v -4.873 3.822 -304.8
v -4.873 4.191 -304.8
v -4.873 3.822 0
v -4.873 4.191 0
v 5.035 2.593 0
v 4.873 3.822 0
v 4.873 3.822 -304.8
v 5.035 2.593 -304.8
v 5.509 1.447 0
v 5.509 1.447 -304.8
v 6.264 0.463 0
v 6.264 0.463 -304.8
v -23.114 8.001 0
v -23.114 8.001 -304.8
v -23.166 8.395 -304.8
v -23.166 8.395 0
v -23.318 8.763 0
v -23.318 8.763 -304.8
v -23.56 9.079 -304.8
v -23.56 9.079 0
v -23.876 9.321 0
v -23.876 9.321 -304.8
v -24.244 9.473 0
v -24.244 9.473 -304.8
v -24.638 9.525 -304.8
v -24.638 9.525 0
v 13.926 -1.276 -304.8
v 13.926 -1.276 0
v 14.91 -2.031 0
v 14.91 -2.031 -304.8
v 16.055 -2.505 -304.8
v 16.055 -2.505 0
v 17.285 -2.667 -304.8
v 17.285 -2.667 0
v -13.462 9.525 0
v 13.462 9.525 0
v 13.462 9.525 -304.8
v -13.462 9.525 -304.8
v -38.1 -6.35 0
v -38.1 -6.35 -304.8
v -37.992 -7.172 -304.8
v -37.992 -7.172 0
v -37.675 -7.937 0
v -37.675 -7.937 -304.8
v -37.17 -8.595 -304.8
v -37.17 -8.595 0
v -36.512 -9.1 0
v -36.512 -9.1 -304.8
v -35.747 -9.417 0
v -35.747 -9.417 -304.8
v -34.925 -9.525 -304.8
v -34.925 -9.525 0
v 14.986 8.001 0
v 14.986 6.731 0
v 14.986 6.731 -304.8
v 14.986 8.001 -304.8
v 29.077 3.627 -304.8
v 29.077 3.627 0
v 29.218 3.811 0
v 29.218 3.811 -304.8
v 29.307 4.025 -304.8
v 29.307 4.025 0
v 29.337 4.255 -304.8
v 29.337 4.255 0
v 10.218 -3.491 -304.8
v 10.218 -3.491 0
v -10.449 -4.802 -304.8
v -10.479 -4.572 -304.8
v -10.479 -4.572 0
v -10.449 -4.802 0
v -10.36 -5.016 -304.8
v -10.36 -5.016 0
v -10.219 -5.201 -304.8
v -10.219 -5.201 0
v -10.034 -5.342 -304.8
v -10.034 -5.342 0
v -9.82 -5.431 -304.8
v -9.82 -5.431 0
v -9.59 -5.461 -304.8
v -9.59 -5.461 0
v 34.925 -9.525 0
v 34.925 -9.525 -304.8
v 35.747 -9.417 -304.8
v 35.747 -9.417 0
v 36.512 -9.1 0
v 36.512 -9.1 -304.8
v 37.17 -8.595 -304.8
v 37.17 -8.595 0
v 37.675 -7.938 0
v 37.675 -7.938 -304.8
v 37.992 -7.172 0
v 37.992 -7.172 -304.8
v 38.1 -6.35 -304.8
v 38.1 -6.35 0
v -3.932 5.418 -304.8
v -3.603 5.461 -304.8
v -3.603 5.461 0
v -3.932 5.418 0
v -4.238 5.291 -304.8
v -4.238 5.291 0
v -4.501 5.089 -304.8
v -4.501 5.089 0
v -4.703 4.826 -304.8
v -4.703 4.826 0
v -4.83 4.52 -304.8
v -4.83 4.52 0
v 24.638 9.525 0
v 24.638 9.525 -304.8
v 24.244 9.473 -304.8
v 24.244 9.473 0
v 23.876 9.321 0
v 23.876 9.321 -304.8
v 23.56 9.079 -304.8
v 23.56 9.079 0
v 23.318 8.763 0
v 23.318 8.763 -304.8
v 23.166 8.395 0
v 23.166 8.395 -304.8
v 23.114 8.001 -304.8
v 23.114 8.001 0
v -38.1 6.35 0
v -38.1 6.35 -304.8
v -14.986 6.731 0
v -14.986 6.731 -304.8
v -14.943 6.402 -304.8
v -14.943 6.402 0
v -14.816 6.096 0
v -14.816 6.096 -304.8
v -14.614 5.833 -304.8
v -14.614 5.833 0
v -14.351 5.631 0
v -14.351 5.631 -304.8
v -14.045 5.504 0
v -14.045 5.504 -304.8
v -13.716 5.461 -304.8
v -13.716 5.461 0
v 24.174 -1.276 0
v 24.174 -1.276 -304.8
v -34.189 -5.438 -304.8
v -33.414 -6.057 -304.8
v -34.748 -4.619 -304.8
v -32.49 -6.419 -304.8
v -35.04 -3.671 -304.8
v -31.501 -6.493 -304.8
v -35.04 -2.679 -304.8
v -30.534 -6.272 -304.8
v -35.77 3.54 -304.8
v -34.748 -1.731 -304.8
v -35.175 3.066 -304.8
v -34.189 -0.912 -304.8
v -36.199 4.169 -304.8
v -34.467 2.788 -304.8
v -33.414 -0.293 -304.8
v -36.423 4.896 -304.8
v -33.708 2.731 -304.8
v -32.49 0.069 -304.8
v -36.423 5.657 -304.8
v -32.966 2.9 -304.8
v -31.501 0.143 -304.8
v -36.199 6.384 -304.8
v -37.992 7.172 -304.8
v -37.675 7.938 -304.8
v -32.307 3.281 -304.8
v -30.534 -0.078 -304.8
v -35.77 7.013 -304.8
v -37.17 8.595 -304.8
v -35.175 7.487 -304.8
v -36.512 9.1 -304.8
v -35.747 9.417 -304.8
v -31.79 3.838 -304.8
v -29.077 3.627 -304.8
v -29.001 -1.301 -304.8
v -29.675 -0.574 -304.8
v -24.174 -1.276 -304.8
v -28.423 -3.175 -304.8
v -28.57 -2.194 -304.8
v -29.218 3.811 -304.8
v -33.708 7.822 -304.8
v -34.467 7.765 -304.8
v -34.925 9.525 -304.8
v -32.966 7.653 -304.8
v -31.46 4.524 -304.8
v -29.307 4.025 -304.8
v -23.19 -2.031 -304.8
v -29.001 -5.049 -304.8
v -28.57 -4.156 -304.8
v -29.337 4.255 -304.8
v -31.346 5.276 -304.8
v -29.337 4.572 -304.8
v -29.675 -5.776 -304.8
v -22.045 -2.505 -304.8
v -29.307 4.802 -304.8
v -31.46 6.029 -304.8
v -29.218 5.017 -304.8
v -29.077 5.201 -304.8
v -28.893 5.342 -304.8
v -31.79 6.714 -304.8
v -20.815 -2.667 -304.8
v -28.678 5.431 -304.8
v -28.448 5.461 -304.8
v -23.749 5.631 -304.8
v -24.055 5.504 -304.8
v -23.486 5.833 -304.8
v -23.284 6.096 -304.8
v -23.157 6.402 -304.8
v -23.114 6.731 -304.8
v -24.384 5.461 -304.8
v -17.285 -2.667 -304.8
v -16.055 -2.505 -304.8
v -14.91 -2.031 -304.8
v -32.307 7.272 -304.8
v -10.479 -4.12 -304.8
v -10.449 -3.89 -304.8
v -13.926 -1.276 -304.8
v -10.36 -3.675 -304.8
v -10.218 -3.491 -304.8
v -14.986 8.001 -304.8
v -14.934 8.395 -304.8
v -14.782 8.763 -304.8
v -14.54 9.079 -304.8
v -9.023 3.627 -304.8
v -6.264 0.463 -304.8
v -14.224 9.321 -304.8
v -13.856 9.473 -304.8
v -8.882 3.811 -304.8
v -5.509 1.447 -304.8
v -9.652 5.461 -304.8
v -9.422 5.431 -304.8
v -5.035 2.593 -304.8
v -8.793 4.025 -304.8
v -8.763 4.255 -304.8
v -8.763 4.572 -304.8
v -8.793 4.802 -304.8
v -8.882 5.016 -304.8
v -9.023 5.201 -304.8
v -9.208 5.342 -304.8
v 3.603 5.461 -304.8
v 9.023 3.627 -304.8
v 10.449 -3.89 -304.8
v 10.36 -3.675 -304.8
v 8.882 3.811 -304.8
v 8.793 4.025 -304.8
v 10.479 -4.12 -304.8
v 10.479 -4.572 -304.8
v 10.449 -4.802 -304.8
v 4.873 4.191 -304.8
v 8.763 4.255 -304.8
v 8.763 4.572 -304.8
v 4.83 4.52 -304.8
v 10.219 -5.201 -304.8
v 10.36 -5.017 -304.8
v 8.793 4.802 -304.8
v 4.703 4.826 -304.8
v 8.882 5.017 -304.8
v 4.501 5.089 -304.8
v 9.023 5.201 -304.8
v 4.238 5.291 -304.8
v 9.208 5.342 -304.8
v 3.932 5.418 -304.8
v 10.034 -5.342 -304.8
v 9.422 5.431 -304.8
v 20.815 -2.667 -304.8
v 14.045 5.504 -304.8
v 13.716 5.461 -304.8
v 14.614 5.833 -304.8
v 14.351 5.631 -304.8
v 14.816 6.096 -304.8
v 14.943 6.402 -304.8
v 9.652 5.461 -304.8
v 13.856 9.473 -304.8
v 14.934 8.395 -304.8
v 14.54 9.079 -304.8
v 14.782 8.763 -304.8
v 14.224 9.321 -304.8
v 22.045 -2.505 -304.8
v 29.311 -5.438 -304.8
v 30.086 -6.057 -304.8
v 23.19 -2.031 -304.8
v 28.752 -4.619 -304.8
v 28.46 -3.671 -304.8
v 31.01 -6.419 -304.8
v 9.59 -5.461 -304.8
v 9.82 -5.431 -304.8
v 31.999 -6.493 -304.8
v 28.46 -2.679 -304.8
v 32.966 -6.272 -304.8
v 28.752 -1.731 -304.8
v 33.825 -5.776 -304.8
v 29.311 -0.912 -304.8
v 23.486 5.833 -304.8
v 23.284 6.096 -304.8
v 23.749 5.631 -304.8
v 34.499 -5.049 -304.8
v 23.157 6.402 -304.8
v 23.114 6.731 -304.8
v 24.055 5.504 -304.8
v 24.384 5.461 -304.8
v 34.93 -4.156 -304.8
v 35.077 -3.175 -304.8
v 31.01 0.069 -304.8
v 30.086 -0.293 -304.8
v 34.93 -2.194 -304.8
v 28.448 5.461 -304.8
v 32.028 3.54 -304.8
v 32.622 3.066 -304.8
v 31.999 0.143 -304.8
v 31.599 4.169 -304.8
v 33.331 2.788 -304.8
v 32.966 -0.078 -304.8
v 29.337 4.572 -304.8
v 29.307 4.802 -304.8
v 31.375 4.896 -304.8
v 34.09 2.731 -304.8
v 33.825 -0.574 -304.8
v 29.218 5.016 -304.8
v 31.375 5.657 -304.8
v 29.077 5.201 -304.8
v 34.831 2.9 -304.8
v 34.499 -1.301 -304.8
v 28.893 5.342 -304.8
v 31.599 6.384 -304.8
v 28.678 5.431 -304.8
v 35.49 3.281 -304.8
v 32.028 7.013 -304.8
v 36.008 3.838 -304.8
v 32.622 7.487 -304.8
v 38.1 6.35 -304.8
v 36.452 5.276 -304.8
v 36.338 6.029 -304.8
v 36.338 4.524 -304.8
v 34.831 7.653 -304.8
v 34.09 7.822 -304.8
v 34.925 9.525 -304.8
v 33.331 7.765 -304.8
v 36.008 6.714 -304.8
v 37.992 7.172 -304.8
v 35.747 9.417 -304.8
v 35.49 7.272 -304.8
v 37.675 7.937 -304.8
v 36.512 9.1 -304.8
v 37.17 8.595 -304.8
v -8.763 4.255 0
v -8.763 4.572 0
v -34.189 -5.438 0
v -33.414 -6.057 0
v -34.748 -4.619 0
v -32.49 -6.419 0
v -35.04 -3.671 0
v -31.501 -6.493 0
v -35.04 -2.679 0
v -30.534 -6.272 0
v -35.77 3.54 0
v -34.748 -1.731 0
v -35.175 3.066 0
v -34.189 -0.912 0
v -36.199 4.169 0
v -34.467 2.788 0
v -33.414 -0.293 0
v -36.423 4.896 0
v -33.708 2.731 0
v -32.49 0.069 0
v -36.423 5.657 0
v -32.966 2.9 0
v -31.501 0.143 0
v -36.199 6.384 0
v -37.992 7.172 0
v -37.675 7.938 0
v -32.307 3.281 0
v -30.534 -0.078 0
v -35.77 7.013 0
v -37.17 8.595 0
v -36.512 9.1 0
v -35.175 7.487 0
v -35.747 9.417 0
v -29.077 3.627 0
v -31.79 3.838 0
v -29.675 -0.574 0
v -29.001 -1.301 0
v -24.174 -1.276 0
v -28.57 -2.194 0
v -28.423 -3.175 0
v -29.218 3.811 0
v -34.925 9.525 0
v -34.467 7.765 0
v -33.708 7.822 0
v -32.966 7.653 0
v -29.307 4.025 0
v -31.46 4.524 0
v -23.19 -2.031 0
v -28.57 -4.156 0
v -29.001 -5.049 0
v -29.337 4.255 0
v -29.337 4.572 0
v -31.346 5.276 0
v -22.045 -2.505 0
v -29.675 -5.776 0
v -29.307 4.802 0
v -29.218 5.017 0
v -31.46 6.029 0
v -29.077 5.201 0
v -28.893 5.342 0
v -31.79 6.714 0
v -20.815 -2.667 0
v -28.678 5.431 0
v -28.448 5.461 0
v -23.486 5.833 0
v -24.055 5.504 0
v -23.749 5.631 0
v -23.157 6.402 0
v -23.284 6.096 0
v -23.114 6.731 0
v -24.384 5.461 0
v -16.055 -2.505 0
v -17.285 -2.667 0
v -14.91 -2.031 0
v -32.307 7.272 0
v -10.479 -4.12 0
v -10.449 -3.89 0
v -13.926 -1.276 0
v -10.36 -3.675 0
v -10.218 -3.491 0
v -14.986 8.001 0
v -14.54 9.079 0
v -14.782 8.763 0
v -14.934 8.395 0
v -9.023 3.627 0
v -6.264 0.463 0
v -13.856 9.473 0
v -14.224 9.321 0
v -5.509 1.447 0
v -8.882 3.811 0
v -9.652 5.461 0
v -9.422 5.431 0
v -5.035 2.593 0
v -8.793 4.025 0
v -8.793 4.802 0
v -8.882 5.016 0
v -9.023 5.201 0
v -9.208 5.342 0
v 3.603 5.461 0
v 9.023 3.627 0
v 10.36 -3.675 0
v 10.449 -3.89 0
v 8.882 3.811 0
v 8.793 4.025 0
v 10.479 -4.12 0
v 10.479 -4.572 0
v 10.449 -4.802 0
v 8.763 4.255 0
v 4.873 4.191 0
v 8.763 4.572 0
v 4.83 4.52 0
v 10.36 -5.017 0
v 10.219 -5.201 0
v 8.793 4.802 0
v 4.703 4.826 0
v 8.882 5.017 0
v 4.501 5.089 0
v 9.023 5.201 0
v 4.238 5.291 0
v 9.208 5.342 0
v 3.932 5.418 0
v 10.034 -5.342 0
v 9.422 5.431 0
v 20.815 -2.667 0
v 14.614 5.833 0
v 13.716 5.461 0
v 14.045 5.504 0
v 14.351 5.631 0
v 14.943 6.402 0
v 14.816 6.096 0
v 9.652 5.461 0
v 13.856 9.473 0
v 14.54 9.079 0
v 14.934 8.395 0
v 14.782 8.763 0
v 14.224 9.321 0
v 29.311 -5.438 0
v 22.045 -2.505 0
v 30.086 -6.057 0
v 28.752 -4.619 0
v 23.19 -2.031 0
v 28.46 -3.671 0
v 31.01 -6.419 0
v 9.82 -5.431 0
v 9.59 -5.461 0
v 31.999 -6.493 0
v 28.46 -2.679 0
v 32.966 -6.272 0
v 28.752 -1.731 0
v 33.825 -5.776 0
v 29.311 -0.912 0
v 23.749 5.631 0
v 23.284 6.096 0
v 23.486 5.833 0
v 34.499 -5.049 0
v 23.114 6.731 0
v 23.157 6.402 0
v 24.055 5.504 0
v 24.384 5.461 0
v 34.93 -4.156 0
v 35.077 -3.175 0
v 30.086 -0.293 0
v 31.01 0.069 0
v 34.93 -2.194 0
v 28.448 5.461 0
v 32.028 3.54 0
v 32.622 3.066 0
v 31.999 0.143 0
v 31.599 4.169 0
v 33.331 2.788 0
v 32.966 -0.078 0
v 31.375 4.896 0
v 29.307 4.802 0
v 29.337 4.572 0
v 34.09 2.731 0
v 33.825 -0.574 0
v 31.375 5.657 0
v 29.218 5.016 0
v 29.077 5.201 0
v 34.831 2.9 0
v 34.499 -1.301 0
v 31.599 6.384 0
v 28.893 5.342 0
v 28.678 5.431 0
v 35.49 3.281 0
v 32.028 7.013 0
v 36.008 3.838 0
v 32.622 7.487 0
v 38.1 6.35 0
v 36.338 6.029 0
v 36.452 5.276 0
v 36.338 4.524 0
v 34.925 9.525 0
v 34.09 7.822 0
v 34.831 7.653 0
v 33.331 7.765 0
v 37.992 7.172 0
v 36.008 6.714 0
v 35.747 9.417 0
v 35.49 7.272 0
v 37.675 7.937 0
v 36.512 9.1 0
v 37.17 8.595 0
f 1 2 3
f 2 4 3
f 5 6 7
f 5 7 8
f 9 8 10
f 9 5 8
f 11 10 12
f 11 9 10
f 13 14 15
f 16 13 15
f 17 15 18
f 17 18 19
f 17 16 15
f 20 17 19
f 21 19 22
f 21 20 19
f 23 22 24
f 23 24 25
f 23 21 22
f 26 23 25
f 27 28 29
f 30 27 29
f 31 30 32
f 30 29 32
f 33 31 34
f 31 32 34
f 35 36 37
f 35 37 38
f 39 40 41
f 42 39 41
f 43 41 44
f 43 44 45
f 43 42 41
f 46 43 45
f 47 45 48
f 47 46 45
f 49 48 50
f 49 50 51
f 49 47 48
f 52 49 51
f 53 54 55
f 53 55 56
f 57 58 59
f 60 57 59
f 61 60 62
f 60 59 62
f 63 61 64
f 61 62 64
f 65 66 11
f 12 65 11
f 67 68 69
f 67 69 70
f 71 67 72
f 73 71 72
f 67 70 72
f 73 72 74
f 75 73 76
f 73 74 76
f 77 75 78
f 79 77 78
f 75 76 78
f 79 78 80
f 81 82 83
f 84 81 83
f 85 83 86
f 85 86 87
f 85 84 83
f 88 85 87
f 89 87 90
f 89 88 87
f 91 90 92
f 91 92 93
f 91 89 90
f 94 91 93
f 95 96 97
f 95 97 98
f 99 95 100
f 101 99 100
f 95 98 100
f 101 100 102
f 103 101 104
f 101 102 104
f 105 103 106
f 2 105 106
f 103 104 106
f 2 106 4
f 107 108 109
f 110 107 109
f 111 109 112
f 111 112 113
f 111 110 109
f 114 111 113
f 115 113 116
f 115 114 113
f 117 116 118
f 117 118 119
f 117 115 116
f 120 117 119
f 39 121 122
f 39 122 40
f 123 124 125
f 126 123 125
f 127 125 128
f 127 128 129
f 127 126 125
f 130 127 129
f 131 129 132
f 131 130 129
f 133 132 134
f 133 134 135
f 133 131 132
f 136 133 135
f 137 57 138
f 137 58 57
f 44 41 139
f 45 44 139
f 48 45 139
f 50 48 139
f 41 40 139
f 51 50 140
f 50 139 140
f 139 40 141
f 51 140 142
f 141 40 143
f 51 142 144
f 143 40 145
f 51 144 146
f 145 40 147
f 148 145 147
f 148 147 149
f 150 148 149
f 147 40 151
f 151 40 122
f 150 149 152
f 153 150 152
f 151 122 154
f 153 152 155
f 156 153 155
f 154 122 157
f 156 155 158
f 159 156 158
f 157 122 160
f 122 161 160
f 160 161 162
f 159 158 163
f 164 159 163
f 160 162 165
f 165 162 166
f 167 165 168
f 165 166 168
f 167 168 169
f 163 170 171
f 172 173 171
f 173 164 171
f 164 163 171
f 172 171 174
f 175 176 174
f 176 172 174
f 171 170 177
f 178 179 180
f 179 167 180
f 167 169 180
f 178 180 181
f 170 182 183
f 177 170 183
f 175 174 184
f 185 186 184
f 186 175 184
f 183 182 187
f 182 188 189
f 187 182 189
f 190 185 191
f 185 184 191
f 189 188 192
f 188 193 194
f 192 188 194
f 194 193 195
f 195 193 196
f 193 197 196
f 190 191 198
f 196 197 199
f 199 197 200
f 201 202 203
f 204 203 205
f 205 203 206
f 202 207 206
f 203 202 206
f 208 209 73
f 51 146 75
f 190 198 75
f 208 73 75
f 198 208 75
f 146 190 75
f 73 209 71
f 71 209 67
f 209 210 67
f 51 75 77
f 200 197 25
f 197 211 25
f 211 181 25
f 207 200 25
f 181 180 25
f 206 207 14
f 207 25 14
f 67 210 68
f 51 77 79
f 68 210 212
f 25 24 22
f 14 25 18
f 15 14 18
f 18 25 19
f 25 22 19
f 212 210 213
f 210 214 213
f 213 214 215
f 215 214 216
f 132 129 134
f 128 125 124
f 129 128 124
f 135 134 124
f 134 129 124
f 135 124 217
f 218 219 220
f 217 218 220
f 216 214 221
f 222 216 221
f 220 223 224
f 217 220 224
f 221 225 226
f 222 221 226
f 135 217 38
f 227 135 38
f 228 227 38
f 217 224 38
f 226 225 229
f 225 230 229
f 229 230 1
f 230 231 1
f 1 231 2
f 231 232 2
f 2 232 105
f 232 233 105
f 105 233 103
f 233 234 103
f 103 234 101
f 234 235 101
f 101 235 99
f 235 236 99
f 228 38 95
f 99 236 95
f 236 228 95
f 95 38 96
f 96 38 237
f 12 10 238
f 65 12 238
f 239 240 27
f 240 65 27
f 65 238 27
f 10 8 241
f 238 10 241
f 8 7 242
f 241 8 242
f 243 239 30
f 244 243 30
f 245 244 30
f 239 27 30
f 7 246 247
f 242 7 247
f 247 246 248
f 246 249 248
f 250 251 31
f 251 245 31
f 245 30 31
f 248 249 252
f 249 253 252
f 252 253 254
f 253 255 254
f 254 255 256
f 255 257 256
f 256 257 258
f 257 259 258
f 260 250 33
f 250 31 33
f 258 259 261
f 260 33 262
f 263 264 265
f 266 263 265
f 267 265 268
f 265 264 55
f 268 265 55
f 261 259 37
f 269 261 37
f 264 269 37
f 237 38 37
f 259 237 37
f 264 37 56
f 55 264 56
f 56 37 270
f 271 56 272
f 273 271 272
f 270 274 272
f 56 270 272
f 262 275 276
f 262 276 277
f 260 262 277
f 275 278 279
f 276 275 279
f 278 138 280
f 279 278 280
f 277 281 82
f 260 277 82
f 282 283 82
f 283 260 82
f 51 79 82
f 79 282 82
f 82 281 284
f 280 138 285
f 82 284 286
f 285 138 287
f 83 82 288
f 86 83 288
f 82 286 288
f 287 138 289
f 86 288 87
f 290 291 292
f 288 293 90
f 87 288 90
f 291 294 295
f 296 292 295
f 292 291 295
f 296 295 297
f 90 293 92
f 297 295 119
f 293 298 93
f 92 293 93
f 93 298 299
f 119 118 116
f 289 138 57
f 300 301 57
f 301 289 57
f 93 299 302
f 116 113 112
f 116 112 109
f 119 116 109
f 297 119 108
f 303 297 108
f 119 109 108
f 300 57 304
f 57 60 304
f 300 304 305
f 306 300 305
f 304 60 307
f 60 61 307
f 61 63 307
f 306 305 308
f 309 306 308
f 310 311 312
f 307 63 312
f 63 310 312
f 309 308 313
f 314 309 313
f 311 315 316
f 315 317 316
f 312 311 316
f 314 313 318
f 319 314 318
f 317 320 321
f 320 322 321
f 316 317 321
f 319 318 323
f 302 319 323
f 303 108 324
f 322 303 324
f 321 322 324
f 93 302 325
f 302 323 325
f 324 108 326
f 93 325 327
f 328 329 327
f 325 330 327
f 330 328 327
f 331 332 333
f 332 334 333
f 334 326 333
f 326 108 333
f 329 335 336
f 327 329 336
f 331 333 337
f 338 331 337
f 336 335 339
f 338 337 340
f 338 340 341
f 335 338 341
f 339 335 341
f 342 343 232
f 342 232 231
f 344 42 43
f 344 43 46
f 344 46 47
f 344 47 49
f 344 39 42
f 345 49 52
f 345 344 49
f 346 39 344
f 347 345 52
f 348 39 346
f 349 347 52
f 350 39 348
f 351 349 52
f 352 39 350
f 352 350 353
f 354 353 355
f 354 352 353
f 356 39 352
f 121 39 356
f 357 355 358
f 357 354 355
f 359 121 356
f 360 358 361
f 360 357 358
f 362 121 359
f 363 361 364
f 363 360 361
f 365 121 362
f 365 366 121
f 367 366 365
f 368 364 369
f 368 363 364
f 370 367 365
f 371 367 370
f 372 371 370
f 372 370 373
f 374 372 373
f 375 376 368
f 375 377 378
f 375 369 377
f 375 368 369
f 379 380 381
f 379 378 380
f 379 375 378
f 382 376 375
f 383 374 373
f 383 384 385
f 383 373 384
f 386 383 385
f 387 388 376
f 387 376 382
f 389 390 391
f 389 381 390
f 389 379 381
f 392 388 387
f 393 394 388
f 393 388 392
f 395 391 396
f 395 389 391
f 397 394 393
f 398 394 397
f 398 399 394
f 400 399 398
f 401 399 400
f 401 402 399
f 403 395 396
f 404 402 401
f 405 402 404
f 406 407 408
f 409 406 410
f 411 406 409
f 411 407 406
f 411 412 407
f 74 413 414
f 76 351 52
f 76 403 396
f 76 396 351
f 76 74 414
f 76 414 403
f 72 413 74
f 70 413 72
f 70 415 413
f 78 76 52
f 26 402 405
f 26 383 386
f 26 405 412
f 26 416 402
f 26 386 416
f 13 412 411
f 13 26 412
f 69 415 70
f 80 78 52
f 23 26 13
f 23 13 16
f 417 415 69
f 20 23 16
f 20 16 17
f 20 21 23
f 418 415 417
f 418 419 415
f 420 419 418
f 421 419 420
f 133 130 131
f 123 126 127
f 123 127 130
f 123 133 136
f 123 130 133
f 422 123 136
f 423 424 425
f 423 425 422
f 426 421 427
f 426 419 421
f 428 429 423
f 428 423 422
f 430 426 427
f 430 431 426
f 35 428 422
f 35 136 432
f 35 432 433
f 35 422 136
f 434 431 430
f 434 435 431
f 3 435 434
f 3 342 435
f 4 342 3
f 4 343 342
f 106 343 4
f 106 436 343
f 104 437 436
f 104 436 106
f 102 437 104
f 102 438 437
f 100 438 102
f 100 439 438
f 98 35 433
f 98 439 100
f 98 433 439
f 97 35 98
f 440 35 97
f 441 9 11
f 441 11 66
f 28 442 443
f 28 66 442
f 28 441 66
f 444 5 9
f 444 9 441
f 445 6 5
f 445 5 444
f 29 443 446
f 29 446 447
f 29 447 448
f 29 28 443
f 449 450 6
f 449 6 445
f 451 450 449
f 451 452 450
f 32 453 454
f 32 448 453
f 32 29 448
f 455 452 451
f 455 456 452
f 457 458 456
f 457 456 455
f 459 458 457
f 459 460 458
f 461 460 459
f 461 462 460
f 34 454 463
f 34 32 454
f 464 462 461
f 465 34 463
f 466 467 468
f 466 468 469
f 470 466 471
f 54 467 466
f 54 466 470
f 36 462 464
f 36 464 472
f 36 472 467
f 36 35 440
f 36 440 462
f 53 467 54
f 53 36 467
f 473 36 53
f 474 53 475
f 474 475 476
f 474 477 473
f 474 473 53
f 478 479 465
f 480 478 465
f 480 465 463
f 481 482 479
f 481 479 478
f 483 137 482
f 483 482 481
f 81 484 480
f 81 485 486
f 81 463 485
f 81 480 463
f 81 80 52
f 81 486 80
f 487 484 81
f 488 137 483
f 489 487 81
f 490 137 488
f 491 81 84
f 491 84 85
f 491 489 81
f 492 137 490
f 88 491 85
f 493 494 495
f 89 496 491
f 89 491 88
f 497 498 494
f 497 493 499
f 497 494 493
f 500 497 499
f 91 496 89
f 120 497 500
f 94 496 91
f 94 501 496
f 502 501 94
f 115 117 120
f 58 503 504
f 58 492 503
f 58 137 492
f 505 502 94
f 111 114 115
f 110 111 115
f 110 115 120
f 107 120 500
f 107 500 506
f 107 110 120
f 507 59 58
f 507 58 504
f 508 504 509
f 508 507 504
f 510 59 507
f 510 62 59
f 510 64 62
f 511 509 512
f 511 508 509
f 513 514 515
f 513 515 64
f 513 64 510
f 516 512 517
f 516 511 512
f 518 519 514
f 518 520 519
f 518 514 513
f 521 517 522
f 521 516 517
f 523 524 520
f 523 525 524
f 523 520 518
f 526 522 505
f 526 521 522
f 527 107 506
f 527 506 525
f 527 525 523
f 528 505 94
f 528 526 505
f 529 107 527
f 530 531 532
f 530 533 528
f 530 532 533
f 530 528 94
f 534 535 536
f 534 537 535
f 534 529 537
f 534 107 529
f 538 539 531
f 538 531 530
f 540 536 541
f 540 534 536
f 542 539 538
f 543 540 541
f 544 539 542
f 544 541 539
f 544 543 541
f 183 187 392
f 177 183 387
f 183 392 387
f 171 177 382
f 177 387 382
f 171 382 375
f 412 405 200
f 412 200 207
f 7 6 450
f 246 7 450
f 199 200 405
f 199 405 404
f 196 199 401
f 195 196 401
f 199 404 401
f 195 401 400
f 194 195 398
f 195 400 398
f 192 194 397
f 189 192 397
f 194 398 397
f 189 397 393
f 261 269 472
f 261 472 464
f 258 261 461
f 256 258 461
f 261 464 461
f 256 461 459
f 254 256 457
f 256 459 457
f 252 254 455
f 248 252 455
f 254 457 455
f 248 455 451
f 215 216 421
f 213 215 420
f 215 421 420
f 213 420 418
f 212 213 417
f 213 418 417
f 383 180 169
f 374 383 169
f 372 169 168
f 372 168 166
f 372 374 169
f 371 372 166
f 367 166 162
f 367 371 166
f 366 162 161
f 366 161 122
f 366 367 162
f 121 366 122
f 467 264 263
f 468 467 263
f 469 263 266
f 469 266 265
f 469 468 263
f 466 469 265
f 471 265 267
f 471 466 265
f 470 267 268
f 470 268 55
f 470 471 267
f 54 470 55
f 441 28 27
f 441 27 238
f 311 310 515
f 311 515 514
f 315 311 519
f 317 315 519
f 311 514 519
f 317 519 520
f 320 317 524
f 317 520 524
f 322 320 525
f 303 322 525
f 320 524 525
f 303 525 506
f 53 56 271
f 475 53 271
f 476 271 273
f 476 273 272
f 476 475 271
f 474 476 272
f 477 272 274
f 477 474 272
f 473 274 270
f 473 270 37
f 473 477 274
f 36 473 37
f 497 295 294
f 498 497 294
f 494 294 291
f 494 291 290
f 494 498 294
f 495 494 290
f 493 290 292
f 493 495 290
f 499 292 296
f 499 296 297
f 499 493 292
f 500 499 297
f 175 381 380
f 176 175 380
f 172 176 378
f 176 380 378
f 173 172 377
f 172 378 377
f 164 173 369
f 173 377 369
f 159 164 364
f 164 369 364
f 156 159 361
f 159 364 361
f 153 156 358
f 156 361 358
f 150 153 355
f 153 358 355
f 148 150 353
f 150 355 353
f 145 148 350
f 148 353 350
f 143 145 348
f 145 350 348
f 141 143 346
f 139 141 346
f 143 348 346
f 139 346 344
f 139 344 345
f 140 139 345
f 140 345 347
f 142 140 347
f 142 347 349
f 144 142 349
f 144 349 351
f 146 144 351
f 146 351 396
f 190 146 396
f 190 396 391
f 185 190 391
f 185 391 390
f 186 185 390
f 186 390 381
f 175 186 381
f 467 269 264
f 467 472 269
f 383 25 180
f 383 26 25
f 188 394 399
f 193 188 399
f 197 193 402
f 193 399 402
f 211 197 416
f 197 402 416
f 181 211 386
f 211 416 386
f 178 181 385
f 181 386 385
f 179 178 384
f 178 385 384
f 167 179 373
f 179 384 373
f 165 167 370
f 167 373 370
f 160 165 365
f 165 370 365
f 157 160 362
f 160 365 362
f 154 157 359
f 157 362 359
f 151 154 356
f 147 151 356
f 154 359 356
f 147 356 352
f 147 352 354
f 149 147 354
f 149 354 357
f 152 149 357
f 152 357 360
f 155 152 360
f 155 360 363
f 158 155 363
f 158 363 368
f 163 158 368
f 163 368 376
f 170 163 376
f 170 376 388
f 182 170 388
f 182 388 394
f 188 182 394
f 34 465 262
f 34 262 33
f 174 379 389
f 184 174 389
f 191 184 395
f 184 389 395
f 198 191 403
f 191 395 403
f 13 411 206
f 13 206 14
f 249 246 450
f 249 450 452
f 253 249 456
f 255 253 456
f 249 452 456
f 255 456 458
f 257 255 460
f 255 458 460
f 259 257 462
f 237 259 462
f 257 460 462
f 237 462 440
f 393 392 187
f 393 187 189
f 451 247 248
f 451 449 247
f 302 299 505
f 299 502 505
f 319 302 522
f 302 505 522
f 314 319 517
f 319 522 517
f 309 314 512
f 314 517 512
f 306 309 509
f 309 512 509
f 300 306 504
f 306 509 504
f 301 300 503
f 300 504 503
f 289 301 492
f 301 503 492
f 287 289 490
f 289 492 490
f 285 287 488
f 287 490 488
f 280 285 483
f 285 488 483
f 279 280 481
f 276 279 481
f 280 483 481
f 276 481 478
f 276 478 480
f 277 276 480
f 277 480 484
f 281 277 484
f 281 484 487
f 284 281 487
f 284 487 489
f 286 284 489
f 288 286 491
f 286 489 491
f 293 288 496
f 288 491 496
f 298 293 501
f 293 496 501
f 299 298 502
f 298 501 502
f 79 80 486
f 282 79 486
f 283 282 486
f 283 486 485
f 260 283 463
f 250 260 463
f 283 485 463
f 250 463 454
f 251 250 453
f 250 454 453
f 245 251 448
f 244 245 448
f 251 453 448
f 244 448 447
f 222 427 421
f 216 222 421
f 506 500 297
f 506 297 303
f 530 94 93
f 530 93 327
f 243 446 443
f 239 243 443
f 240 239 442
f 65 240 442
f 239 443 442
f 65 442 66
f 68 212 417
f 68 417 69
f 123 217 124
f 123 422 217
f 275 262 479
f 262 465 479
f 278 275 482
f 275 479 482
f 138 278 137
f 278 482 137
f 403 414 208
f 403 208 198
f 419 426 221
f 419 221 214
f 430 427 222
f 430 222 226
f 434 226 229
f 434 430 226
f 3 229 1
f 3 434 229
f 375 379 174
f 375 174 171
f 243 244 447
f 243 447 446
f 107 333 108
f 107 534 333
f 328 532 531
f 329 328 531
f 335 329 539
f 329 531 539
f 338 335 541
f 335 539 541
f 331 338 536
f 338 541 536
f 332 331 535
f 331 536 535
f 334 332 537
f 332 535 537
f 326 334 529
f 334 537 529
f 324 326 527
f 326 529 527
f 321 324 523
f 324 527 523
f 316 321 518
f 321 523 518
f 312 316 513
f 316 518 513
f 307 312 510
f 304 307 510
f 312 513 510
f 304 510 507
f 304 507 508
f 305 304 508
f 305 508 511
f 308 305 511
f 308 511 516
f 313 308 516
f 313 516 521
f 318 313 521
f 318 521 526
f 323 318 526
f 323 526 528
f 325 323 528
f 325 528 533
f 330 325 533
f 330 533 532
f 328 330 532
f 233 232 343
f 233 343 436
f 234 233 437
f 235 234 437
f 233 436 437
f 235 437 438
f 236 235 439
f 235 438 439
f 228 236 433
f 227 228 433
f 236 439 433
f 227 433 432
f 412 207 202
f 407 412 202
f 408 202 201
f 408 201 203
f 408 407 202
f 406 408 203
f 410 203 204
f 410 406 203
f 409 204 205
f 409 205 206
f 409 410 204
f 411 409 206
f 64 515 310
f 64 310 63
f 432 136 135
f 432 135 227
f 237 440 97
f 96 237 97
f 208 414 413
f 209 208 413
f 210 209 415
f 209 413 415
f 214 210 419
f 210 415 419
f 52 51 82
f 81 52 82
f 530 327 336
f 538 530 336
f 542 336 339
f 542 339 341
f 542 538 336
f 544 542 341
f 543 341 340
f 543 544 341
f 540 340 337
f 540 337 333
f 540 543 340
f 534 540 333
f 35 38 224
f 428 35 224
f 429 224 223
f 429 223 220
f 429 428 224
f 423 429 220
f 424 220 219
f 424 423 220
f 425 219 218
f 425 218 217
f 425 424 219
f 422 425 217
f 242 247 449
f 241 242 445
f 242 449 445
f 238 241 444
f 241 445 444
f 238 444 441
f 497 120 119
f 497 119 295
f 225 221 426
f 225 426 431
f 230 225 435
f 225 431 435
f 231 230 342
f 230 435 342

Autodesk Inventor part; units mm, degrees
ref_plane "YZ Plane" through (0, 0, 0) normal (1, 0, 0) x (0, 1, 0)
ref_plane "XZ Plane" through (0, 0, 0) normal (0, 1, 0) x (-1, 0, 0)
ref_plane "XY Plane" through (0, 0, 0) normal (0, 0, 1) x (1, 0, 0)
sketch "Sketch1" plane through (0, 0, 0) normal (0, 0, 1) x (1, 0, 0)
  circle A0 centre (31.75, -3.175) radius 3.3274
  circle A1 centre (33.8988, 5.2764) radius 2.5527
  circle A2 centre (-33.8988, 5.2764) radius 2.5527
  circle A3 centre (-31.75, -3.175) radius 3.3274
  line L0 (-9.5899, -5.461) -> (9.5899, -5.461)
  arc A4 (-10.4789, -4.572) -> (-9.5899, -5.461) centre (-9.5899, -4.572) ccw
  line L1 (-10.4789, -4.1197) -> (-10.4789, -4.572)
  arc A5 (-10.2185, -3.4911) -> (-10.4789, -4.1197) centre (-9.5899, -4.1197) ccw
  line L2 (-6.264, 0.4634) -> (-10.2185, -3.4911)
  arc A6 (-6.264, 0.4634) -> (-4.8728, 3.822) centre (-9.6226, 3.822) ccw
  line L3 (-4.8728, 4.191) -> (-4.8728, 3.822)
  arc A7 (-3.6028, 5.461) -> (-4.8728, 4.191) centre (-3.6028, 4.191) ccw
  line L4 (3.6028, 5.461) -> (-3.6028, 5.461)
  arc A8 (4.8728, 4.191) -> (3.6028, 5.461) centre (3.6028, 4.191) ccw
  line L5 (4.8728, 3.822) -> (4.8728, 4.191)
  arc A9 (4.8728, 3.822) -> (6.264, 0.4634) centre (9.6226, 3.822) ccw
  line L6 (10.2185, -3.4911) -> (6.264, 0.4634)
  arc A10 (10.4789, -4.1197) -> (10.2185, -3.4911) centre (9.5899, -4.1197) ccw
  line L7 (10.4789, -4.572) -> (10.4789, -4.1197)
  arc A11 (9.5899, -5.461) -> (10.4789, -4.572) centre (9.5899, -4.572) ccw
  arc A12 (24.638, 9.525) -> (23.114, 8.001) centre (24.638, 8.001) ccw
  line L8 (23.114, 8.001) -> (23.114, 6.731)
  arc A13 (23.114, 6.731) -> (24.384, 5.461) centre (24.384, 6.731) ccw
  line L9 (24.384, 5.461) -> (28.448, 5.461)
  arc A14 (29.337, 4.572) -> (28.448, 5.461) centre (28.448, 4.572) ccw
  line L10 (29.337, 4.572) -> (29.337, 4.2554)
  arc A15 (29.0766, 3.6267) -> (29.337, 4.2554) centre (28.448, 4.2554) ccw
  line L11 (29.0766, 3.6267) -> (24.1741, -1.2758)
  arc A16 (20.8154, -2.667) -> (24.1741, -1.2758) centre (20.8154, 2.0828) ccw
  line L12 (20.8154, -2.667) -> (17.2846, -2.667)
  arc A17 (13.9259, -1.2758) -> (17.2846, -2.667) centre (17.2846, 2.0828) ccw
  line L13 (13.9259, -1.2758) -> (9.0234, 3.6267)
  arc A18 (8.763, 4.2554) -> (9.0234, 3.6267) centre (9.652, 4.2554) ccw
  line L14 (8.763, 4.2554) -> (8.763, 4.572)
  arc A19 (9.652, 5.461) -> (8.763, 4.572) centre (9.652, 4.572) ccw
  line L15 (9.652, 5.461) -> (13.716, 5.461)
  arc A20 (13.716, 5.461) -> (14.986, 6.731) centre (13.716, 6.731) ccw
  line L16 (14.986, 6.731) -> (14.986, 8.001)
  arc A21 (14.986, 8.001) -> (13.462, 9.525) centre (13.462, 8.001) ccw
  line L17 (13.462, 9.525) -> (-13.462, 9.525)
  arc A22 (-13.462, 9.525) -> (-14.986, 8.001) centre (-13.462, 8.001) ccw
  line L18 (-14.986, 8.001) -> (-14.986, 6.731)
  arc A23 (-14.986, 6.731) -> (-13.716, 5.461) centre (-13.716, 6.731) ccw
  line L19 (-13.716, 5.461) -> (-9.652, 5.461)
  arc A24 (-8.763, 4.572) -> (-9.652, 5.461) centre (-9.652, 4.572) ccw
  line L20 (-8.763, 4.572) -> (-8.763, 4.2554)
  arc A25 (-9.0234, 3.6267) -> (-8.763, 4.2554) centre (-9.652, 4.2554) ccw
  line L21 (-9.0234, 3.6267) -> (-13.9259, -1.2758)
  arc A26 (-17.2846, -2.667) -> (-13.9259, -1.2758) centre (-17.2846, 2.0828) ccw
  line L22 (-17.2846, -2.667) -> (-20.8154, -2.667)
  arc A27 (-24.1741, -1.2758) -> (-20.8154, -2.667) centre (-20.8154, 2.0828) ccw
  line L23 (-24.1741, -1.2758) -> (-29.0766, 3.6267)
  arc A28 (-29.337, 4.2554) -> (-29.0766, 3.6267) centre (-28.448, 4.2554) ccw
  line L24 (-29.337, 4.2554) -> (-29.337, 4.572)
  arc A29 (-28.448, 5.461) -> (-29.337, 4.572) centre (-28.448, 4.572) ccw
  line L25 (-28.448, 5.461) -> (-24.384, 5.461)
  arc A30 (-24.384, 5.461) -> (-23.114, 6.731) centre (-24.384, 6.731) ccw
  line L26 (-23.114, 6.731) -> (-23.114, 8.001)
  arc A31 (-23.114, 8.001) -> (-24.638, 9.525) centre (-24.638, 8.001) ccw
  line L27 (-24.638, 9.525) -> (-34.925, 9.525)
  arc A32 (-34.925, 9.525) -> (-38.1, 6.35) centre (-34.925, 6.35) ccw
  line L28 (-38.1, 6.35) -> (-38.1, -6.35)
  arc A33 (-38.1, -6.35) -> (-34.925, -9.525) centre (-34.925, -6.35) ccw
  line L29 (-34.925, -9.525) -> (34.925, -9.525)
  arc A34 (34.925, -9.525) -> (38.1, -6.35) centre (34.925, -6.35) ccw
  line L30 (38.1, -6.35) -> (38.1, 6.35)
  arc A35 (38.1, 6.35) -> (34.925, 9.525) centre (34.925, 6.35) ccw
  line L31 (34.925, 9.525) -> (24.638, 9.525)
  point P0 (0, 0)
extrude "Extrusion1" add sketch "Sketch1" against normal blind 304.8
properties part number "3075"
